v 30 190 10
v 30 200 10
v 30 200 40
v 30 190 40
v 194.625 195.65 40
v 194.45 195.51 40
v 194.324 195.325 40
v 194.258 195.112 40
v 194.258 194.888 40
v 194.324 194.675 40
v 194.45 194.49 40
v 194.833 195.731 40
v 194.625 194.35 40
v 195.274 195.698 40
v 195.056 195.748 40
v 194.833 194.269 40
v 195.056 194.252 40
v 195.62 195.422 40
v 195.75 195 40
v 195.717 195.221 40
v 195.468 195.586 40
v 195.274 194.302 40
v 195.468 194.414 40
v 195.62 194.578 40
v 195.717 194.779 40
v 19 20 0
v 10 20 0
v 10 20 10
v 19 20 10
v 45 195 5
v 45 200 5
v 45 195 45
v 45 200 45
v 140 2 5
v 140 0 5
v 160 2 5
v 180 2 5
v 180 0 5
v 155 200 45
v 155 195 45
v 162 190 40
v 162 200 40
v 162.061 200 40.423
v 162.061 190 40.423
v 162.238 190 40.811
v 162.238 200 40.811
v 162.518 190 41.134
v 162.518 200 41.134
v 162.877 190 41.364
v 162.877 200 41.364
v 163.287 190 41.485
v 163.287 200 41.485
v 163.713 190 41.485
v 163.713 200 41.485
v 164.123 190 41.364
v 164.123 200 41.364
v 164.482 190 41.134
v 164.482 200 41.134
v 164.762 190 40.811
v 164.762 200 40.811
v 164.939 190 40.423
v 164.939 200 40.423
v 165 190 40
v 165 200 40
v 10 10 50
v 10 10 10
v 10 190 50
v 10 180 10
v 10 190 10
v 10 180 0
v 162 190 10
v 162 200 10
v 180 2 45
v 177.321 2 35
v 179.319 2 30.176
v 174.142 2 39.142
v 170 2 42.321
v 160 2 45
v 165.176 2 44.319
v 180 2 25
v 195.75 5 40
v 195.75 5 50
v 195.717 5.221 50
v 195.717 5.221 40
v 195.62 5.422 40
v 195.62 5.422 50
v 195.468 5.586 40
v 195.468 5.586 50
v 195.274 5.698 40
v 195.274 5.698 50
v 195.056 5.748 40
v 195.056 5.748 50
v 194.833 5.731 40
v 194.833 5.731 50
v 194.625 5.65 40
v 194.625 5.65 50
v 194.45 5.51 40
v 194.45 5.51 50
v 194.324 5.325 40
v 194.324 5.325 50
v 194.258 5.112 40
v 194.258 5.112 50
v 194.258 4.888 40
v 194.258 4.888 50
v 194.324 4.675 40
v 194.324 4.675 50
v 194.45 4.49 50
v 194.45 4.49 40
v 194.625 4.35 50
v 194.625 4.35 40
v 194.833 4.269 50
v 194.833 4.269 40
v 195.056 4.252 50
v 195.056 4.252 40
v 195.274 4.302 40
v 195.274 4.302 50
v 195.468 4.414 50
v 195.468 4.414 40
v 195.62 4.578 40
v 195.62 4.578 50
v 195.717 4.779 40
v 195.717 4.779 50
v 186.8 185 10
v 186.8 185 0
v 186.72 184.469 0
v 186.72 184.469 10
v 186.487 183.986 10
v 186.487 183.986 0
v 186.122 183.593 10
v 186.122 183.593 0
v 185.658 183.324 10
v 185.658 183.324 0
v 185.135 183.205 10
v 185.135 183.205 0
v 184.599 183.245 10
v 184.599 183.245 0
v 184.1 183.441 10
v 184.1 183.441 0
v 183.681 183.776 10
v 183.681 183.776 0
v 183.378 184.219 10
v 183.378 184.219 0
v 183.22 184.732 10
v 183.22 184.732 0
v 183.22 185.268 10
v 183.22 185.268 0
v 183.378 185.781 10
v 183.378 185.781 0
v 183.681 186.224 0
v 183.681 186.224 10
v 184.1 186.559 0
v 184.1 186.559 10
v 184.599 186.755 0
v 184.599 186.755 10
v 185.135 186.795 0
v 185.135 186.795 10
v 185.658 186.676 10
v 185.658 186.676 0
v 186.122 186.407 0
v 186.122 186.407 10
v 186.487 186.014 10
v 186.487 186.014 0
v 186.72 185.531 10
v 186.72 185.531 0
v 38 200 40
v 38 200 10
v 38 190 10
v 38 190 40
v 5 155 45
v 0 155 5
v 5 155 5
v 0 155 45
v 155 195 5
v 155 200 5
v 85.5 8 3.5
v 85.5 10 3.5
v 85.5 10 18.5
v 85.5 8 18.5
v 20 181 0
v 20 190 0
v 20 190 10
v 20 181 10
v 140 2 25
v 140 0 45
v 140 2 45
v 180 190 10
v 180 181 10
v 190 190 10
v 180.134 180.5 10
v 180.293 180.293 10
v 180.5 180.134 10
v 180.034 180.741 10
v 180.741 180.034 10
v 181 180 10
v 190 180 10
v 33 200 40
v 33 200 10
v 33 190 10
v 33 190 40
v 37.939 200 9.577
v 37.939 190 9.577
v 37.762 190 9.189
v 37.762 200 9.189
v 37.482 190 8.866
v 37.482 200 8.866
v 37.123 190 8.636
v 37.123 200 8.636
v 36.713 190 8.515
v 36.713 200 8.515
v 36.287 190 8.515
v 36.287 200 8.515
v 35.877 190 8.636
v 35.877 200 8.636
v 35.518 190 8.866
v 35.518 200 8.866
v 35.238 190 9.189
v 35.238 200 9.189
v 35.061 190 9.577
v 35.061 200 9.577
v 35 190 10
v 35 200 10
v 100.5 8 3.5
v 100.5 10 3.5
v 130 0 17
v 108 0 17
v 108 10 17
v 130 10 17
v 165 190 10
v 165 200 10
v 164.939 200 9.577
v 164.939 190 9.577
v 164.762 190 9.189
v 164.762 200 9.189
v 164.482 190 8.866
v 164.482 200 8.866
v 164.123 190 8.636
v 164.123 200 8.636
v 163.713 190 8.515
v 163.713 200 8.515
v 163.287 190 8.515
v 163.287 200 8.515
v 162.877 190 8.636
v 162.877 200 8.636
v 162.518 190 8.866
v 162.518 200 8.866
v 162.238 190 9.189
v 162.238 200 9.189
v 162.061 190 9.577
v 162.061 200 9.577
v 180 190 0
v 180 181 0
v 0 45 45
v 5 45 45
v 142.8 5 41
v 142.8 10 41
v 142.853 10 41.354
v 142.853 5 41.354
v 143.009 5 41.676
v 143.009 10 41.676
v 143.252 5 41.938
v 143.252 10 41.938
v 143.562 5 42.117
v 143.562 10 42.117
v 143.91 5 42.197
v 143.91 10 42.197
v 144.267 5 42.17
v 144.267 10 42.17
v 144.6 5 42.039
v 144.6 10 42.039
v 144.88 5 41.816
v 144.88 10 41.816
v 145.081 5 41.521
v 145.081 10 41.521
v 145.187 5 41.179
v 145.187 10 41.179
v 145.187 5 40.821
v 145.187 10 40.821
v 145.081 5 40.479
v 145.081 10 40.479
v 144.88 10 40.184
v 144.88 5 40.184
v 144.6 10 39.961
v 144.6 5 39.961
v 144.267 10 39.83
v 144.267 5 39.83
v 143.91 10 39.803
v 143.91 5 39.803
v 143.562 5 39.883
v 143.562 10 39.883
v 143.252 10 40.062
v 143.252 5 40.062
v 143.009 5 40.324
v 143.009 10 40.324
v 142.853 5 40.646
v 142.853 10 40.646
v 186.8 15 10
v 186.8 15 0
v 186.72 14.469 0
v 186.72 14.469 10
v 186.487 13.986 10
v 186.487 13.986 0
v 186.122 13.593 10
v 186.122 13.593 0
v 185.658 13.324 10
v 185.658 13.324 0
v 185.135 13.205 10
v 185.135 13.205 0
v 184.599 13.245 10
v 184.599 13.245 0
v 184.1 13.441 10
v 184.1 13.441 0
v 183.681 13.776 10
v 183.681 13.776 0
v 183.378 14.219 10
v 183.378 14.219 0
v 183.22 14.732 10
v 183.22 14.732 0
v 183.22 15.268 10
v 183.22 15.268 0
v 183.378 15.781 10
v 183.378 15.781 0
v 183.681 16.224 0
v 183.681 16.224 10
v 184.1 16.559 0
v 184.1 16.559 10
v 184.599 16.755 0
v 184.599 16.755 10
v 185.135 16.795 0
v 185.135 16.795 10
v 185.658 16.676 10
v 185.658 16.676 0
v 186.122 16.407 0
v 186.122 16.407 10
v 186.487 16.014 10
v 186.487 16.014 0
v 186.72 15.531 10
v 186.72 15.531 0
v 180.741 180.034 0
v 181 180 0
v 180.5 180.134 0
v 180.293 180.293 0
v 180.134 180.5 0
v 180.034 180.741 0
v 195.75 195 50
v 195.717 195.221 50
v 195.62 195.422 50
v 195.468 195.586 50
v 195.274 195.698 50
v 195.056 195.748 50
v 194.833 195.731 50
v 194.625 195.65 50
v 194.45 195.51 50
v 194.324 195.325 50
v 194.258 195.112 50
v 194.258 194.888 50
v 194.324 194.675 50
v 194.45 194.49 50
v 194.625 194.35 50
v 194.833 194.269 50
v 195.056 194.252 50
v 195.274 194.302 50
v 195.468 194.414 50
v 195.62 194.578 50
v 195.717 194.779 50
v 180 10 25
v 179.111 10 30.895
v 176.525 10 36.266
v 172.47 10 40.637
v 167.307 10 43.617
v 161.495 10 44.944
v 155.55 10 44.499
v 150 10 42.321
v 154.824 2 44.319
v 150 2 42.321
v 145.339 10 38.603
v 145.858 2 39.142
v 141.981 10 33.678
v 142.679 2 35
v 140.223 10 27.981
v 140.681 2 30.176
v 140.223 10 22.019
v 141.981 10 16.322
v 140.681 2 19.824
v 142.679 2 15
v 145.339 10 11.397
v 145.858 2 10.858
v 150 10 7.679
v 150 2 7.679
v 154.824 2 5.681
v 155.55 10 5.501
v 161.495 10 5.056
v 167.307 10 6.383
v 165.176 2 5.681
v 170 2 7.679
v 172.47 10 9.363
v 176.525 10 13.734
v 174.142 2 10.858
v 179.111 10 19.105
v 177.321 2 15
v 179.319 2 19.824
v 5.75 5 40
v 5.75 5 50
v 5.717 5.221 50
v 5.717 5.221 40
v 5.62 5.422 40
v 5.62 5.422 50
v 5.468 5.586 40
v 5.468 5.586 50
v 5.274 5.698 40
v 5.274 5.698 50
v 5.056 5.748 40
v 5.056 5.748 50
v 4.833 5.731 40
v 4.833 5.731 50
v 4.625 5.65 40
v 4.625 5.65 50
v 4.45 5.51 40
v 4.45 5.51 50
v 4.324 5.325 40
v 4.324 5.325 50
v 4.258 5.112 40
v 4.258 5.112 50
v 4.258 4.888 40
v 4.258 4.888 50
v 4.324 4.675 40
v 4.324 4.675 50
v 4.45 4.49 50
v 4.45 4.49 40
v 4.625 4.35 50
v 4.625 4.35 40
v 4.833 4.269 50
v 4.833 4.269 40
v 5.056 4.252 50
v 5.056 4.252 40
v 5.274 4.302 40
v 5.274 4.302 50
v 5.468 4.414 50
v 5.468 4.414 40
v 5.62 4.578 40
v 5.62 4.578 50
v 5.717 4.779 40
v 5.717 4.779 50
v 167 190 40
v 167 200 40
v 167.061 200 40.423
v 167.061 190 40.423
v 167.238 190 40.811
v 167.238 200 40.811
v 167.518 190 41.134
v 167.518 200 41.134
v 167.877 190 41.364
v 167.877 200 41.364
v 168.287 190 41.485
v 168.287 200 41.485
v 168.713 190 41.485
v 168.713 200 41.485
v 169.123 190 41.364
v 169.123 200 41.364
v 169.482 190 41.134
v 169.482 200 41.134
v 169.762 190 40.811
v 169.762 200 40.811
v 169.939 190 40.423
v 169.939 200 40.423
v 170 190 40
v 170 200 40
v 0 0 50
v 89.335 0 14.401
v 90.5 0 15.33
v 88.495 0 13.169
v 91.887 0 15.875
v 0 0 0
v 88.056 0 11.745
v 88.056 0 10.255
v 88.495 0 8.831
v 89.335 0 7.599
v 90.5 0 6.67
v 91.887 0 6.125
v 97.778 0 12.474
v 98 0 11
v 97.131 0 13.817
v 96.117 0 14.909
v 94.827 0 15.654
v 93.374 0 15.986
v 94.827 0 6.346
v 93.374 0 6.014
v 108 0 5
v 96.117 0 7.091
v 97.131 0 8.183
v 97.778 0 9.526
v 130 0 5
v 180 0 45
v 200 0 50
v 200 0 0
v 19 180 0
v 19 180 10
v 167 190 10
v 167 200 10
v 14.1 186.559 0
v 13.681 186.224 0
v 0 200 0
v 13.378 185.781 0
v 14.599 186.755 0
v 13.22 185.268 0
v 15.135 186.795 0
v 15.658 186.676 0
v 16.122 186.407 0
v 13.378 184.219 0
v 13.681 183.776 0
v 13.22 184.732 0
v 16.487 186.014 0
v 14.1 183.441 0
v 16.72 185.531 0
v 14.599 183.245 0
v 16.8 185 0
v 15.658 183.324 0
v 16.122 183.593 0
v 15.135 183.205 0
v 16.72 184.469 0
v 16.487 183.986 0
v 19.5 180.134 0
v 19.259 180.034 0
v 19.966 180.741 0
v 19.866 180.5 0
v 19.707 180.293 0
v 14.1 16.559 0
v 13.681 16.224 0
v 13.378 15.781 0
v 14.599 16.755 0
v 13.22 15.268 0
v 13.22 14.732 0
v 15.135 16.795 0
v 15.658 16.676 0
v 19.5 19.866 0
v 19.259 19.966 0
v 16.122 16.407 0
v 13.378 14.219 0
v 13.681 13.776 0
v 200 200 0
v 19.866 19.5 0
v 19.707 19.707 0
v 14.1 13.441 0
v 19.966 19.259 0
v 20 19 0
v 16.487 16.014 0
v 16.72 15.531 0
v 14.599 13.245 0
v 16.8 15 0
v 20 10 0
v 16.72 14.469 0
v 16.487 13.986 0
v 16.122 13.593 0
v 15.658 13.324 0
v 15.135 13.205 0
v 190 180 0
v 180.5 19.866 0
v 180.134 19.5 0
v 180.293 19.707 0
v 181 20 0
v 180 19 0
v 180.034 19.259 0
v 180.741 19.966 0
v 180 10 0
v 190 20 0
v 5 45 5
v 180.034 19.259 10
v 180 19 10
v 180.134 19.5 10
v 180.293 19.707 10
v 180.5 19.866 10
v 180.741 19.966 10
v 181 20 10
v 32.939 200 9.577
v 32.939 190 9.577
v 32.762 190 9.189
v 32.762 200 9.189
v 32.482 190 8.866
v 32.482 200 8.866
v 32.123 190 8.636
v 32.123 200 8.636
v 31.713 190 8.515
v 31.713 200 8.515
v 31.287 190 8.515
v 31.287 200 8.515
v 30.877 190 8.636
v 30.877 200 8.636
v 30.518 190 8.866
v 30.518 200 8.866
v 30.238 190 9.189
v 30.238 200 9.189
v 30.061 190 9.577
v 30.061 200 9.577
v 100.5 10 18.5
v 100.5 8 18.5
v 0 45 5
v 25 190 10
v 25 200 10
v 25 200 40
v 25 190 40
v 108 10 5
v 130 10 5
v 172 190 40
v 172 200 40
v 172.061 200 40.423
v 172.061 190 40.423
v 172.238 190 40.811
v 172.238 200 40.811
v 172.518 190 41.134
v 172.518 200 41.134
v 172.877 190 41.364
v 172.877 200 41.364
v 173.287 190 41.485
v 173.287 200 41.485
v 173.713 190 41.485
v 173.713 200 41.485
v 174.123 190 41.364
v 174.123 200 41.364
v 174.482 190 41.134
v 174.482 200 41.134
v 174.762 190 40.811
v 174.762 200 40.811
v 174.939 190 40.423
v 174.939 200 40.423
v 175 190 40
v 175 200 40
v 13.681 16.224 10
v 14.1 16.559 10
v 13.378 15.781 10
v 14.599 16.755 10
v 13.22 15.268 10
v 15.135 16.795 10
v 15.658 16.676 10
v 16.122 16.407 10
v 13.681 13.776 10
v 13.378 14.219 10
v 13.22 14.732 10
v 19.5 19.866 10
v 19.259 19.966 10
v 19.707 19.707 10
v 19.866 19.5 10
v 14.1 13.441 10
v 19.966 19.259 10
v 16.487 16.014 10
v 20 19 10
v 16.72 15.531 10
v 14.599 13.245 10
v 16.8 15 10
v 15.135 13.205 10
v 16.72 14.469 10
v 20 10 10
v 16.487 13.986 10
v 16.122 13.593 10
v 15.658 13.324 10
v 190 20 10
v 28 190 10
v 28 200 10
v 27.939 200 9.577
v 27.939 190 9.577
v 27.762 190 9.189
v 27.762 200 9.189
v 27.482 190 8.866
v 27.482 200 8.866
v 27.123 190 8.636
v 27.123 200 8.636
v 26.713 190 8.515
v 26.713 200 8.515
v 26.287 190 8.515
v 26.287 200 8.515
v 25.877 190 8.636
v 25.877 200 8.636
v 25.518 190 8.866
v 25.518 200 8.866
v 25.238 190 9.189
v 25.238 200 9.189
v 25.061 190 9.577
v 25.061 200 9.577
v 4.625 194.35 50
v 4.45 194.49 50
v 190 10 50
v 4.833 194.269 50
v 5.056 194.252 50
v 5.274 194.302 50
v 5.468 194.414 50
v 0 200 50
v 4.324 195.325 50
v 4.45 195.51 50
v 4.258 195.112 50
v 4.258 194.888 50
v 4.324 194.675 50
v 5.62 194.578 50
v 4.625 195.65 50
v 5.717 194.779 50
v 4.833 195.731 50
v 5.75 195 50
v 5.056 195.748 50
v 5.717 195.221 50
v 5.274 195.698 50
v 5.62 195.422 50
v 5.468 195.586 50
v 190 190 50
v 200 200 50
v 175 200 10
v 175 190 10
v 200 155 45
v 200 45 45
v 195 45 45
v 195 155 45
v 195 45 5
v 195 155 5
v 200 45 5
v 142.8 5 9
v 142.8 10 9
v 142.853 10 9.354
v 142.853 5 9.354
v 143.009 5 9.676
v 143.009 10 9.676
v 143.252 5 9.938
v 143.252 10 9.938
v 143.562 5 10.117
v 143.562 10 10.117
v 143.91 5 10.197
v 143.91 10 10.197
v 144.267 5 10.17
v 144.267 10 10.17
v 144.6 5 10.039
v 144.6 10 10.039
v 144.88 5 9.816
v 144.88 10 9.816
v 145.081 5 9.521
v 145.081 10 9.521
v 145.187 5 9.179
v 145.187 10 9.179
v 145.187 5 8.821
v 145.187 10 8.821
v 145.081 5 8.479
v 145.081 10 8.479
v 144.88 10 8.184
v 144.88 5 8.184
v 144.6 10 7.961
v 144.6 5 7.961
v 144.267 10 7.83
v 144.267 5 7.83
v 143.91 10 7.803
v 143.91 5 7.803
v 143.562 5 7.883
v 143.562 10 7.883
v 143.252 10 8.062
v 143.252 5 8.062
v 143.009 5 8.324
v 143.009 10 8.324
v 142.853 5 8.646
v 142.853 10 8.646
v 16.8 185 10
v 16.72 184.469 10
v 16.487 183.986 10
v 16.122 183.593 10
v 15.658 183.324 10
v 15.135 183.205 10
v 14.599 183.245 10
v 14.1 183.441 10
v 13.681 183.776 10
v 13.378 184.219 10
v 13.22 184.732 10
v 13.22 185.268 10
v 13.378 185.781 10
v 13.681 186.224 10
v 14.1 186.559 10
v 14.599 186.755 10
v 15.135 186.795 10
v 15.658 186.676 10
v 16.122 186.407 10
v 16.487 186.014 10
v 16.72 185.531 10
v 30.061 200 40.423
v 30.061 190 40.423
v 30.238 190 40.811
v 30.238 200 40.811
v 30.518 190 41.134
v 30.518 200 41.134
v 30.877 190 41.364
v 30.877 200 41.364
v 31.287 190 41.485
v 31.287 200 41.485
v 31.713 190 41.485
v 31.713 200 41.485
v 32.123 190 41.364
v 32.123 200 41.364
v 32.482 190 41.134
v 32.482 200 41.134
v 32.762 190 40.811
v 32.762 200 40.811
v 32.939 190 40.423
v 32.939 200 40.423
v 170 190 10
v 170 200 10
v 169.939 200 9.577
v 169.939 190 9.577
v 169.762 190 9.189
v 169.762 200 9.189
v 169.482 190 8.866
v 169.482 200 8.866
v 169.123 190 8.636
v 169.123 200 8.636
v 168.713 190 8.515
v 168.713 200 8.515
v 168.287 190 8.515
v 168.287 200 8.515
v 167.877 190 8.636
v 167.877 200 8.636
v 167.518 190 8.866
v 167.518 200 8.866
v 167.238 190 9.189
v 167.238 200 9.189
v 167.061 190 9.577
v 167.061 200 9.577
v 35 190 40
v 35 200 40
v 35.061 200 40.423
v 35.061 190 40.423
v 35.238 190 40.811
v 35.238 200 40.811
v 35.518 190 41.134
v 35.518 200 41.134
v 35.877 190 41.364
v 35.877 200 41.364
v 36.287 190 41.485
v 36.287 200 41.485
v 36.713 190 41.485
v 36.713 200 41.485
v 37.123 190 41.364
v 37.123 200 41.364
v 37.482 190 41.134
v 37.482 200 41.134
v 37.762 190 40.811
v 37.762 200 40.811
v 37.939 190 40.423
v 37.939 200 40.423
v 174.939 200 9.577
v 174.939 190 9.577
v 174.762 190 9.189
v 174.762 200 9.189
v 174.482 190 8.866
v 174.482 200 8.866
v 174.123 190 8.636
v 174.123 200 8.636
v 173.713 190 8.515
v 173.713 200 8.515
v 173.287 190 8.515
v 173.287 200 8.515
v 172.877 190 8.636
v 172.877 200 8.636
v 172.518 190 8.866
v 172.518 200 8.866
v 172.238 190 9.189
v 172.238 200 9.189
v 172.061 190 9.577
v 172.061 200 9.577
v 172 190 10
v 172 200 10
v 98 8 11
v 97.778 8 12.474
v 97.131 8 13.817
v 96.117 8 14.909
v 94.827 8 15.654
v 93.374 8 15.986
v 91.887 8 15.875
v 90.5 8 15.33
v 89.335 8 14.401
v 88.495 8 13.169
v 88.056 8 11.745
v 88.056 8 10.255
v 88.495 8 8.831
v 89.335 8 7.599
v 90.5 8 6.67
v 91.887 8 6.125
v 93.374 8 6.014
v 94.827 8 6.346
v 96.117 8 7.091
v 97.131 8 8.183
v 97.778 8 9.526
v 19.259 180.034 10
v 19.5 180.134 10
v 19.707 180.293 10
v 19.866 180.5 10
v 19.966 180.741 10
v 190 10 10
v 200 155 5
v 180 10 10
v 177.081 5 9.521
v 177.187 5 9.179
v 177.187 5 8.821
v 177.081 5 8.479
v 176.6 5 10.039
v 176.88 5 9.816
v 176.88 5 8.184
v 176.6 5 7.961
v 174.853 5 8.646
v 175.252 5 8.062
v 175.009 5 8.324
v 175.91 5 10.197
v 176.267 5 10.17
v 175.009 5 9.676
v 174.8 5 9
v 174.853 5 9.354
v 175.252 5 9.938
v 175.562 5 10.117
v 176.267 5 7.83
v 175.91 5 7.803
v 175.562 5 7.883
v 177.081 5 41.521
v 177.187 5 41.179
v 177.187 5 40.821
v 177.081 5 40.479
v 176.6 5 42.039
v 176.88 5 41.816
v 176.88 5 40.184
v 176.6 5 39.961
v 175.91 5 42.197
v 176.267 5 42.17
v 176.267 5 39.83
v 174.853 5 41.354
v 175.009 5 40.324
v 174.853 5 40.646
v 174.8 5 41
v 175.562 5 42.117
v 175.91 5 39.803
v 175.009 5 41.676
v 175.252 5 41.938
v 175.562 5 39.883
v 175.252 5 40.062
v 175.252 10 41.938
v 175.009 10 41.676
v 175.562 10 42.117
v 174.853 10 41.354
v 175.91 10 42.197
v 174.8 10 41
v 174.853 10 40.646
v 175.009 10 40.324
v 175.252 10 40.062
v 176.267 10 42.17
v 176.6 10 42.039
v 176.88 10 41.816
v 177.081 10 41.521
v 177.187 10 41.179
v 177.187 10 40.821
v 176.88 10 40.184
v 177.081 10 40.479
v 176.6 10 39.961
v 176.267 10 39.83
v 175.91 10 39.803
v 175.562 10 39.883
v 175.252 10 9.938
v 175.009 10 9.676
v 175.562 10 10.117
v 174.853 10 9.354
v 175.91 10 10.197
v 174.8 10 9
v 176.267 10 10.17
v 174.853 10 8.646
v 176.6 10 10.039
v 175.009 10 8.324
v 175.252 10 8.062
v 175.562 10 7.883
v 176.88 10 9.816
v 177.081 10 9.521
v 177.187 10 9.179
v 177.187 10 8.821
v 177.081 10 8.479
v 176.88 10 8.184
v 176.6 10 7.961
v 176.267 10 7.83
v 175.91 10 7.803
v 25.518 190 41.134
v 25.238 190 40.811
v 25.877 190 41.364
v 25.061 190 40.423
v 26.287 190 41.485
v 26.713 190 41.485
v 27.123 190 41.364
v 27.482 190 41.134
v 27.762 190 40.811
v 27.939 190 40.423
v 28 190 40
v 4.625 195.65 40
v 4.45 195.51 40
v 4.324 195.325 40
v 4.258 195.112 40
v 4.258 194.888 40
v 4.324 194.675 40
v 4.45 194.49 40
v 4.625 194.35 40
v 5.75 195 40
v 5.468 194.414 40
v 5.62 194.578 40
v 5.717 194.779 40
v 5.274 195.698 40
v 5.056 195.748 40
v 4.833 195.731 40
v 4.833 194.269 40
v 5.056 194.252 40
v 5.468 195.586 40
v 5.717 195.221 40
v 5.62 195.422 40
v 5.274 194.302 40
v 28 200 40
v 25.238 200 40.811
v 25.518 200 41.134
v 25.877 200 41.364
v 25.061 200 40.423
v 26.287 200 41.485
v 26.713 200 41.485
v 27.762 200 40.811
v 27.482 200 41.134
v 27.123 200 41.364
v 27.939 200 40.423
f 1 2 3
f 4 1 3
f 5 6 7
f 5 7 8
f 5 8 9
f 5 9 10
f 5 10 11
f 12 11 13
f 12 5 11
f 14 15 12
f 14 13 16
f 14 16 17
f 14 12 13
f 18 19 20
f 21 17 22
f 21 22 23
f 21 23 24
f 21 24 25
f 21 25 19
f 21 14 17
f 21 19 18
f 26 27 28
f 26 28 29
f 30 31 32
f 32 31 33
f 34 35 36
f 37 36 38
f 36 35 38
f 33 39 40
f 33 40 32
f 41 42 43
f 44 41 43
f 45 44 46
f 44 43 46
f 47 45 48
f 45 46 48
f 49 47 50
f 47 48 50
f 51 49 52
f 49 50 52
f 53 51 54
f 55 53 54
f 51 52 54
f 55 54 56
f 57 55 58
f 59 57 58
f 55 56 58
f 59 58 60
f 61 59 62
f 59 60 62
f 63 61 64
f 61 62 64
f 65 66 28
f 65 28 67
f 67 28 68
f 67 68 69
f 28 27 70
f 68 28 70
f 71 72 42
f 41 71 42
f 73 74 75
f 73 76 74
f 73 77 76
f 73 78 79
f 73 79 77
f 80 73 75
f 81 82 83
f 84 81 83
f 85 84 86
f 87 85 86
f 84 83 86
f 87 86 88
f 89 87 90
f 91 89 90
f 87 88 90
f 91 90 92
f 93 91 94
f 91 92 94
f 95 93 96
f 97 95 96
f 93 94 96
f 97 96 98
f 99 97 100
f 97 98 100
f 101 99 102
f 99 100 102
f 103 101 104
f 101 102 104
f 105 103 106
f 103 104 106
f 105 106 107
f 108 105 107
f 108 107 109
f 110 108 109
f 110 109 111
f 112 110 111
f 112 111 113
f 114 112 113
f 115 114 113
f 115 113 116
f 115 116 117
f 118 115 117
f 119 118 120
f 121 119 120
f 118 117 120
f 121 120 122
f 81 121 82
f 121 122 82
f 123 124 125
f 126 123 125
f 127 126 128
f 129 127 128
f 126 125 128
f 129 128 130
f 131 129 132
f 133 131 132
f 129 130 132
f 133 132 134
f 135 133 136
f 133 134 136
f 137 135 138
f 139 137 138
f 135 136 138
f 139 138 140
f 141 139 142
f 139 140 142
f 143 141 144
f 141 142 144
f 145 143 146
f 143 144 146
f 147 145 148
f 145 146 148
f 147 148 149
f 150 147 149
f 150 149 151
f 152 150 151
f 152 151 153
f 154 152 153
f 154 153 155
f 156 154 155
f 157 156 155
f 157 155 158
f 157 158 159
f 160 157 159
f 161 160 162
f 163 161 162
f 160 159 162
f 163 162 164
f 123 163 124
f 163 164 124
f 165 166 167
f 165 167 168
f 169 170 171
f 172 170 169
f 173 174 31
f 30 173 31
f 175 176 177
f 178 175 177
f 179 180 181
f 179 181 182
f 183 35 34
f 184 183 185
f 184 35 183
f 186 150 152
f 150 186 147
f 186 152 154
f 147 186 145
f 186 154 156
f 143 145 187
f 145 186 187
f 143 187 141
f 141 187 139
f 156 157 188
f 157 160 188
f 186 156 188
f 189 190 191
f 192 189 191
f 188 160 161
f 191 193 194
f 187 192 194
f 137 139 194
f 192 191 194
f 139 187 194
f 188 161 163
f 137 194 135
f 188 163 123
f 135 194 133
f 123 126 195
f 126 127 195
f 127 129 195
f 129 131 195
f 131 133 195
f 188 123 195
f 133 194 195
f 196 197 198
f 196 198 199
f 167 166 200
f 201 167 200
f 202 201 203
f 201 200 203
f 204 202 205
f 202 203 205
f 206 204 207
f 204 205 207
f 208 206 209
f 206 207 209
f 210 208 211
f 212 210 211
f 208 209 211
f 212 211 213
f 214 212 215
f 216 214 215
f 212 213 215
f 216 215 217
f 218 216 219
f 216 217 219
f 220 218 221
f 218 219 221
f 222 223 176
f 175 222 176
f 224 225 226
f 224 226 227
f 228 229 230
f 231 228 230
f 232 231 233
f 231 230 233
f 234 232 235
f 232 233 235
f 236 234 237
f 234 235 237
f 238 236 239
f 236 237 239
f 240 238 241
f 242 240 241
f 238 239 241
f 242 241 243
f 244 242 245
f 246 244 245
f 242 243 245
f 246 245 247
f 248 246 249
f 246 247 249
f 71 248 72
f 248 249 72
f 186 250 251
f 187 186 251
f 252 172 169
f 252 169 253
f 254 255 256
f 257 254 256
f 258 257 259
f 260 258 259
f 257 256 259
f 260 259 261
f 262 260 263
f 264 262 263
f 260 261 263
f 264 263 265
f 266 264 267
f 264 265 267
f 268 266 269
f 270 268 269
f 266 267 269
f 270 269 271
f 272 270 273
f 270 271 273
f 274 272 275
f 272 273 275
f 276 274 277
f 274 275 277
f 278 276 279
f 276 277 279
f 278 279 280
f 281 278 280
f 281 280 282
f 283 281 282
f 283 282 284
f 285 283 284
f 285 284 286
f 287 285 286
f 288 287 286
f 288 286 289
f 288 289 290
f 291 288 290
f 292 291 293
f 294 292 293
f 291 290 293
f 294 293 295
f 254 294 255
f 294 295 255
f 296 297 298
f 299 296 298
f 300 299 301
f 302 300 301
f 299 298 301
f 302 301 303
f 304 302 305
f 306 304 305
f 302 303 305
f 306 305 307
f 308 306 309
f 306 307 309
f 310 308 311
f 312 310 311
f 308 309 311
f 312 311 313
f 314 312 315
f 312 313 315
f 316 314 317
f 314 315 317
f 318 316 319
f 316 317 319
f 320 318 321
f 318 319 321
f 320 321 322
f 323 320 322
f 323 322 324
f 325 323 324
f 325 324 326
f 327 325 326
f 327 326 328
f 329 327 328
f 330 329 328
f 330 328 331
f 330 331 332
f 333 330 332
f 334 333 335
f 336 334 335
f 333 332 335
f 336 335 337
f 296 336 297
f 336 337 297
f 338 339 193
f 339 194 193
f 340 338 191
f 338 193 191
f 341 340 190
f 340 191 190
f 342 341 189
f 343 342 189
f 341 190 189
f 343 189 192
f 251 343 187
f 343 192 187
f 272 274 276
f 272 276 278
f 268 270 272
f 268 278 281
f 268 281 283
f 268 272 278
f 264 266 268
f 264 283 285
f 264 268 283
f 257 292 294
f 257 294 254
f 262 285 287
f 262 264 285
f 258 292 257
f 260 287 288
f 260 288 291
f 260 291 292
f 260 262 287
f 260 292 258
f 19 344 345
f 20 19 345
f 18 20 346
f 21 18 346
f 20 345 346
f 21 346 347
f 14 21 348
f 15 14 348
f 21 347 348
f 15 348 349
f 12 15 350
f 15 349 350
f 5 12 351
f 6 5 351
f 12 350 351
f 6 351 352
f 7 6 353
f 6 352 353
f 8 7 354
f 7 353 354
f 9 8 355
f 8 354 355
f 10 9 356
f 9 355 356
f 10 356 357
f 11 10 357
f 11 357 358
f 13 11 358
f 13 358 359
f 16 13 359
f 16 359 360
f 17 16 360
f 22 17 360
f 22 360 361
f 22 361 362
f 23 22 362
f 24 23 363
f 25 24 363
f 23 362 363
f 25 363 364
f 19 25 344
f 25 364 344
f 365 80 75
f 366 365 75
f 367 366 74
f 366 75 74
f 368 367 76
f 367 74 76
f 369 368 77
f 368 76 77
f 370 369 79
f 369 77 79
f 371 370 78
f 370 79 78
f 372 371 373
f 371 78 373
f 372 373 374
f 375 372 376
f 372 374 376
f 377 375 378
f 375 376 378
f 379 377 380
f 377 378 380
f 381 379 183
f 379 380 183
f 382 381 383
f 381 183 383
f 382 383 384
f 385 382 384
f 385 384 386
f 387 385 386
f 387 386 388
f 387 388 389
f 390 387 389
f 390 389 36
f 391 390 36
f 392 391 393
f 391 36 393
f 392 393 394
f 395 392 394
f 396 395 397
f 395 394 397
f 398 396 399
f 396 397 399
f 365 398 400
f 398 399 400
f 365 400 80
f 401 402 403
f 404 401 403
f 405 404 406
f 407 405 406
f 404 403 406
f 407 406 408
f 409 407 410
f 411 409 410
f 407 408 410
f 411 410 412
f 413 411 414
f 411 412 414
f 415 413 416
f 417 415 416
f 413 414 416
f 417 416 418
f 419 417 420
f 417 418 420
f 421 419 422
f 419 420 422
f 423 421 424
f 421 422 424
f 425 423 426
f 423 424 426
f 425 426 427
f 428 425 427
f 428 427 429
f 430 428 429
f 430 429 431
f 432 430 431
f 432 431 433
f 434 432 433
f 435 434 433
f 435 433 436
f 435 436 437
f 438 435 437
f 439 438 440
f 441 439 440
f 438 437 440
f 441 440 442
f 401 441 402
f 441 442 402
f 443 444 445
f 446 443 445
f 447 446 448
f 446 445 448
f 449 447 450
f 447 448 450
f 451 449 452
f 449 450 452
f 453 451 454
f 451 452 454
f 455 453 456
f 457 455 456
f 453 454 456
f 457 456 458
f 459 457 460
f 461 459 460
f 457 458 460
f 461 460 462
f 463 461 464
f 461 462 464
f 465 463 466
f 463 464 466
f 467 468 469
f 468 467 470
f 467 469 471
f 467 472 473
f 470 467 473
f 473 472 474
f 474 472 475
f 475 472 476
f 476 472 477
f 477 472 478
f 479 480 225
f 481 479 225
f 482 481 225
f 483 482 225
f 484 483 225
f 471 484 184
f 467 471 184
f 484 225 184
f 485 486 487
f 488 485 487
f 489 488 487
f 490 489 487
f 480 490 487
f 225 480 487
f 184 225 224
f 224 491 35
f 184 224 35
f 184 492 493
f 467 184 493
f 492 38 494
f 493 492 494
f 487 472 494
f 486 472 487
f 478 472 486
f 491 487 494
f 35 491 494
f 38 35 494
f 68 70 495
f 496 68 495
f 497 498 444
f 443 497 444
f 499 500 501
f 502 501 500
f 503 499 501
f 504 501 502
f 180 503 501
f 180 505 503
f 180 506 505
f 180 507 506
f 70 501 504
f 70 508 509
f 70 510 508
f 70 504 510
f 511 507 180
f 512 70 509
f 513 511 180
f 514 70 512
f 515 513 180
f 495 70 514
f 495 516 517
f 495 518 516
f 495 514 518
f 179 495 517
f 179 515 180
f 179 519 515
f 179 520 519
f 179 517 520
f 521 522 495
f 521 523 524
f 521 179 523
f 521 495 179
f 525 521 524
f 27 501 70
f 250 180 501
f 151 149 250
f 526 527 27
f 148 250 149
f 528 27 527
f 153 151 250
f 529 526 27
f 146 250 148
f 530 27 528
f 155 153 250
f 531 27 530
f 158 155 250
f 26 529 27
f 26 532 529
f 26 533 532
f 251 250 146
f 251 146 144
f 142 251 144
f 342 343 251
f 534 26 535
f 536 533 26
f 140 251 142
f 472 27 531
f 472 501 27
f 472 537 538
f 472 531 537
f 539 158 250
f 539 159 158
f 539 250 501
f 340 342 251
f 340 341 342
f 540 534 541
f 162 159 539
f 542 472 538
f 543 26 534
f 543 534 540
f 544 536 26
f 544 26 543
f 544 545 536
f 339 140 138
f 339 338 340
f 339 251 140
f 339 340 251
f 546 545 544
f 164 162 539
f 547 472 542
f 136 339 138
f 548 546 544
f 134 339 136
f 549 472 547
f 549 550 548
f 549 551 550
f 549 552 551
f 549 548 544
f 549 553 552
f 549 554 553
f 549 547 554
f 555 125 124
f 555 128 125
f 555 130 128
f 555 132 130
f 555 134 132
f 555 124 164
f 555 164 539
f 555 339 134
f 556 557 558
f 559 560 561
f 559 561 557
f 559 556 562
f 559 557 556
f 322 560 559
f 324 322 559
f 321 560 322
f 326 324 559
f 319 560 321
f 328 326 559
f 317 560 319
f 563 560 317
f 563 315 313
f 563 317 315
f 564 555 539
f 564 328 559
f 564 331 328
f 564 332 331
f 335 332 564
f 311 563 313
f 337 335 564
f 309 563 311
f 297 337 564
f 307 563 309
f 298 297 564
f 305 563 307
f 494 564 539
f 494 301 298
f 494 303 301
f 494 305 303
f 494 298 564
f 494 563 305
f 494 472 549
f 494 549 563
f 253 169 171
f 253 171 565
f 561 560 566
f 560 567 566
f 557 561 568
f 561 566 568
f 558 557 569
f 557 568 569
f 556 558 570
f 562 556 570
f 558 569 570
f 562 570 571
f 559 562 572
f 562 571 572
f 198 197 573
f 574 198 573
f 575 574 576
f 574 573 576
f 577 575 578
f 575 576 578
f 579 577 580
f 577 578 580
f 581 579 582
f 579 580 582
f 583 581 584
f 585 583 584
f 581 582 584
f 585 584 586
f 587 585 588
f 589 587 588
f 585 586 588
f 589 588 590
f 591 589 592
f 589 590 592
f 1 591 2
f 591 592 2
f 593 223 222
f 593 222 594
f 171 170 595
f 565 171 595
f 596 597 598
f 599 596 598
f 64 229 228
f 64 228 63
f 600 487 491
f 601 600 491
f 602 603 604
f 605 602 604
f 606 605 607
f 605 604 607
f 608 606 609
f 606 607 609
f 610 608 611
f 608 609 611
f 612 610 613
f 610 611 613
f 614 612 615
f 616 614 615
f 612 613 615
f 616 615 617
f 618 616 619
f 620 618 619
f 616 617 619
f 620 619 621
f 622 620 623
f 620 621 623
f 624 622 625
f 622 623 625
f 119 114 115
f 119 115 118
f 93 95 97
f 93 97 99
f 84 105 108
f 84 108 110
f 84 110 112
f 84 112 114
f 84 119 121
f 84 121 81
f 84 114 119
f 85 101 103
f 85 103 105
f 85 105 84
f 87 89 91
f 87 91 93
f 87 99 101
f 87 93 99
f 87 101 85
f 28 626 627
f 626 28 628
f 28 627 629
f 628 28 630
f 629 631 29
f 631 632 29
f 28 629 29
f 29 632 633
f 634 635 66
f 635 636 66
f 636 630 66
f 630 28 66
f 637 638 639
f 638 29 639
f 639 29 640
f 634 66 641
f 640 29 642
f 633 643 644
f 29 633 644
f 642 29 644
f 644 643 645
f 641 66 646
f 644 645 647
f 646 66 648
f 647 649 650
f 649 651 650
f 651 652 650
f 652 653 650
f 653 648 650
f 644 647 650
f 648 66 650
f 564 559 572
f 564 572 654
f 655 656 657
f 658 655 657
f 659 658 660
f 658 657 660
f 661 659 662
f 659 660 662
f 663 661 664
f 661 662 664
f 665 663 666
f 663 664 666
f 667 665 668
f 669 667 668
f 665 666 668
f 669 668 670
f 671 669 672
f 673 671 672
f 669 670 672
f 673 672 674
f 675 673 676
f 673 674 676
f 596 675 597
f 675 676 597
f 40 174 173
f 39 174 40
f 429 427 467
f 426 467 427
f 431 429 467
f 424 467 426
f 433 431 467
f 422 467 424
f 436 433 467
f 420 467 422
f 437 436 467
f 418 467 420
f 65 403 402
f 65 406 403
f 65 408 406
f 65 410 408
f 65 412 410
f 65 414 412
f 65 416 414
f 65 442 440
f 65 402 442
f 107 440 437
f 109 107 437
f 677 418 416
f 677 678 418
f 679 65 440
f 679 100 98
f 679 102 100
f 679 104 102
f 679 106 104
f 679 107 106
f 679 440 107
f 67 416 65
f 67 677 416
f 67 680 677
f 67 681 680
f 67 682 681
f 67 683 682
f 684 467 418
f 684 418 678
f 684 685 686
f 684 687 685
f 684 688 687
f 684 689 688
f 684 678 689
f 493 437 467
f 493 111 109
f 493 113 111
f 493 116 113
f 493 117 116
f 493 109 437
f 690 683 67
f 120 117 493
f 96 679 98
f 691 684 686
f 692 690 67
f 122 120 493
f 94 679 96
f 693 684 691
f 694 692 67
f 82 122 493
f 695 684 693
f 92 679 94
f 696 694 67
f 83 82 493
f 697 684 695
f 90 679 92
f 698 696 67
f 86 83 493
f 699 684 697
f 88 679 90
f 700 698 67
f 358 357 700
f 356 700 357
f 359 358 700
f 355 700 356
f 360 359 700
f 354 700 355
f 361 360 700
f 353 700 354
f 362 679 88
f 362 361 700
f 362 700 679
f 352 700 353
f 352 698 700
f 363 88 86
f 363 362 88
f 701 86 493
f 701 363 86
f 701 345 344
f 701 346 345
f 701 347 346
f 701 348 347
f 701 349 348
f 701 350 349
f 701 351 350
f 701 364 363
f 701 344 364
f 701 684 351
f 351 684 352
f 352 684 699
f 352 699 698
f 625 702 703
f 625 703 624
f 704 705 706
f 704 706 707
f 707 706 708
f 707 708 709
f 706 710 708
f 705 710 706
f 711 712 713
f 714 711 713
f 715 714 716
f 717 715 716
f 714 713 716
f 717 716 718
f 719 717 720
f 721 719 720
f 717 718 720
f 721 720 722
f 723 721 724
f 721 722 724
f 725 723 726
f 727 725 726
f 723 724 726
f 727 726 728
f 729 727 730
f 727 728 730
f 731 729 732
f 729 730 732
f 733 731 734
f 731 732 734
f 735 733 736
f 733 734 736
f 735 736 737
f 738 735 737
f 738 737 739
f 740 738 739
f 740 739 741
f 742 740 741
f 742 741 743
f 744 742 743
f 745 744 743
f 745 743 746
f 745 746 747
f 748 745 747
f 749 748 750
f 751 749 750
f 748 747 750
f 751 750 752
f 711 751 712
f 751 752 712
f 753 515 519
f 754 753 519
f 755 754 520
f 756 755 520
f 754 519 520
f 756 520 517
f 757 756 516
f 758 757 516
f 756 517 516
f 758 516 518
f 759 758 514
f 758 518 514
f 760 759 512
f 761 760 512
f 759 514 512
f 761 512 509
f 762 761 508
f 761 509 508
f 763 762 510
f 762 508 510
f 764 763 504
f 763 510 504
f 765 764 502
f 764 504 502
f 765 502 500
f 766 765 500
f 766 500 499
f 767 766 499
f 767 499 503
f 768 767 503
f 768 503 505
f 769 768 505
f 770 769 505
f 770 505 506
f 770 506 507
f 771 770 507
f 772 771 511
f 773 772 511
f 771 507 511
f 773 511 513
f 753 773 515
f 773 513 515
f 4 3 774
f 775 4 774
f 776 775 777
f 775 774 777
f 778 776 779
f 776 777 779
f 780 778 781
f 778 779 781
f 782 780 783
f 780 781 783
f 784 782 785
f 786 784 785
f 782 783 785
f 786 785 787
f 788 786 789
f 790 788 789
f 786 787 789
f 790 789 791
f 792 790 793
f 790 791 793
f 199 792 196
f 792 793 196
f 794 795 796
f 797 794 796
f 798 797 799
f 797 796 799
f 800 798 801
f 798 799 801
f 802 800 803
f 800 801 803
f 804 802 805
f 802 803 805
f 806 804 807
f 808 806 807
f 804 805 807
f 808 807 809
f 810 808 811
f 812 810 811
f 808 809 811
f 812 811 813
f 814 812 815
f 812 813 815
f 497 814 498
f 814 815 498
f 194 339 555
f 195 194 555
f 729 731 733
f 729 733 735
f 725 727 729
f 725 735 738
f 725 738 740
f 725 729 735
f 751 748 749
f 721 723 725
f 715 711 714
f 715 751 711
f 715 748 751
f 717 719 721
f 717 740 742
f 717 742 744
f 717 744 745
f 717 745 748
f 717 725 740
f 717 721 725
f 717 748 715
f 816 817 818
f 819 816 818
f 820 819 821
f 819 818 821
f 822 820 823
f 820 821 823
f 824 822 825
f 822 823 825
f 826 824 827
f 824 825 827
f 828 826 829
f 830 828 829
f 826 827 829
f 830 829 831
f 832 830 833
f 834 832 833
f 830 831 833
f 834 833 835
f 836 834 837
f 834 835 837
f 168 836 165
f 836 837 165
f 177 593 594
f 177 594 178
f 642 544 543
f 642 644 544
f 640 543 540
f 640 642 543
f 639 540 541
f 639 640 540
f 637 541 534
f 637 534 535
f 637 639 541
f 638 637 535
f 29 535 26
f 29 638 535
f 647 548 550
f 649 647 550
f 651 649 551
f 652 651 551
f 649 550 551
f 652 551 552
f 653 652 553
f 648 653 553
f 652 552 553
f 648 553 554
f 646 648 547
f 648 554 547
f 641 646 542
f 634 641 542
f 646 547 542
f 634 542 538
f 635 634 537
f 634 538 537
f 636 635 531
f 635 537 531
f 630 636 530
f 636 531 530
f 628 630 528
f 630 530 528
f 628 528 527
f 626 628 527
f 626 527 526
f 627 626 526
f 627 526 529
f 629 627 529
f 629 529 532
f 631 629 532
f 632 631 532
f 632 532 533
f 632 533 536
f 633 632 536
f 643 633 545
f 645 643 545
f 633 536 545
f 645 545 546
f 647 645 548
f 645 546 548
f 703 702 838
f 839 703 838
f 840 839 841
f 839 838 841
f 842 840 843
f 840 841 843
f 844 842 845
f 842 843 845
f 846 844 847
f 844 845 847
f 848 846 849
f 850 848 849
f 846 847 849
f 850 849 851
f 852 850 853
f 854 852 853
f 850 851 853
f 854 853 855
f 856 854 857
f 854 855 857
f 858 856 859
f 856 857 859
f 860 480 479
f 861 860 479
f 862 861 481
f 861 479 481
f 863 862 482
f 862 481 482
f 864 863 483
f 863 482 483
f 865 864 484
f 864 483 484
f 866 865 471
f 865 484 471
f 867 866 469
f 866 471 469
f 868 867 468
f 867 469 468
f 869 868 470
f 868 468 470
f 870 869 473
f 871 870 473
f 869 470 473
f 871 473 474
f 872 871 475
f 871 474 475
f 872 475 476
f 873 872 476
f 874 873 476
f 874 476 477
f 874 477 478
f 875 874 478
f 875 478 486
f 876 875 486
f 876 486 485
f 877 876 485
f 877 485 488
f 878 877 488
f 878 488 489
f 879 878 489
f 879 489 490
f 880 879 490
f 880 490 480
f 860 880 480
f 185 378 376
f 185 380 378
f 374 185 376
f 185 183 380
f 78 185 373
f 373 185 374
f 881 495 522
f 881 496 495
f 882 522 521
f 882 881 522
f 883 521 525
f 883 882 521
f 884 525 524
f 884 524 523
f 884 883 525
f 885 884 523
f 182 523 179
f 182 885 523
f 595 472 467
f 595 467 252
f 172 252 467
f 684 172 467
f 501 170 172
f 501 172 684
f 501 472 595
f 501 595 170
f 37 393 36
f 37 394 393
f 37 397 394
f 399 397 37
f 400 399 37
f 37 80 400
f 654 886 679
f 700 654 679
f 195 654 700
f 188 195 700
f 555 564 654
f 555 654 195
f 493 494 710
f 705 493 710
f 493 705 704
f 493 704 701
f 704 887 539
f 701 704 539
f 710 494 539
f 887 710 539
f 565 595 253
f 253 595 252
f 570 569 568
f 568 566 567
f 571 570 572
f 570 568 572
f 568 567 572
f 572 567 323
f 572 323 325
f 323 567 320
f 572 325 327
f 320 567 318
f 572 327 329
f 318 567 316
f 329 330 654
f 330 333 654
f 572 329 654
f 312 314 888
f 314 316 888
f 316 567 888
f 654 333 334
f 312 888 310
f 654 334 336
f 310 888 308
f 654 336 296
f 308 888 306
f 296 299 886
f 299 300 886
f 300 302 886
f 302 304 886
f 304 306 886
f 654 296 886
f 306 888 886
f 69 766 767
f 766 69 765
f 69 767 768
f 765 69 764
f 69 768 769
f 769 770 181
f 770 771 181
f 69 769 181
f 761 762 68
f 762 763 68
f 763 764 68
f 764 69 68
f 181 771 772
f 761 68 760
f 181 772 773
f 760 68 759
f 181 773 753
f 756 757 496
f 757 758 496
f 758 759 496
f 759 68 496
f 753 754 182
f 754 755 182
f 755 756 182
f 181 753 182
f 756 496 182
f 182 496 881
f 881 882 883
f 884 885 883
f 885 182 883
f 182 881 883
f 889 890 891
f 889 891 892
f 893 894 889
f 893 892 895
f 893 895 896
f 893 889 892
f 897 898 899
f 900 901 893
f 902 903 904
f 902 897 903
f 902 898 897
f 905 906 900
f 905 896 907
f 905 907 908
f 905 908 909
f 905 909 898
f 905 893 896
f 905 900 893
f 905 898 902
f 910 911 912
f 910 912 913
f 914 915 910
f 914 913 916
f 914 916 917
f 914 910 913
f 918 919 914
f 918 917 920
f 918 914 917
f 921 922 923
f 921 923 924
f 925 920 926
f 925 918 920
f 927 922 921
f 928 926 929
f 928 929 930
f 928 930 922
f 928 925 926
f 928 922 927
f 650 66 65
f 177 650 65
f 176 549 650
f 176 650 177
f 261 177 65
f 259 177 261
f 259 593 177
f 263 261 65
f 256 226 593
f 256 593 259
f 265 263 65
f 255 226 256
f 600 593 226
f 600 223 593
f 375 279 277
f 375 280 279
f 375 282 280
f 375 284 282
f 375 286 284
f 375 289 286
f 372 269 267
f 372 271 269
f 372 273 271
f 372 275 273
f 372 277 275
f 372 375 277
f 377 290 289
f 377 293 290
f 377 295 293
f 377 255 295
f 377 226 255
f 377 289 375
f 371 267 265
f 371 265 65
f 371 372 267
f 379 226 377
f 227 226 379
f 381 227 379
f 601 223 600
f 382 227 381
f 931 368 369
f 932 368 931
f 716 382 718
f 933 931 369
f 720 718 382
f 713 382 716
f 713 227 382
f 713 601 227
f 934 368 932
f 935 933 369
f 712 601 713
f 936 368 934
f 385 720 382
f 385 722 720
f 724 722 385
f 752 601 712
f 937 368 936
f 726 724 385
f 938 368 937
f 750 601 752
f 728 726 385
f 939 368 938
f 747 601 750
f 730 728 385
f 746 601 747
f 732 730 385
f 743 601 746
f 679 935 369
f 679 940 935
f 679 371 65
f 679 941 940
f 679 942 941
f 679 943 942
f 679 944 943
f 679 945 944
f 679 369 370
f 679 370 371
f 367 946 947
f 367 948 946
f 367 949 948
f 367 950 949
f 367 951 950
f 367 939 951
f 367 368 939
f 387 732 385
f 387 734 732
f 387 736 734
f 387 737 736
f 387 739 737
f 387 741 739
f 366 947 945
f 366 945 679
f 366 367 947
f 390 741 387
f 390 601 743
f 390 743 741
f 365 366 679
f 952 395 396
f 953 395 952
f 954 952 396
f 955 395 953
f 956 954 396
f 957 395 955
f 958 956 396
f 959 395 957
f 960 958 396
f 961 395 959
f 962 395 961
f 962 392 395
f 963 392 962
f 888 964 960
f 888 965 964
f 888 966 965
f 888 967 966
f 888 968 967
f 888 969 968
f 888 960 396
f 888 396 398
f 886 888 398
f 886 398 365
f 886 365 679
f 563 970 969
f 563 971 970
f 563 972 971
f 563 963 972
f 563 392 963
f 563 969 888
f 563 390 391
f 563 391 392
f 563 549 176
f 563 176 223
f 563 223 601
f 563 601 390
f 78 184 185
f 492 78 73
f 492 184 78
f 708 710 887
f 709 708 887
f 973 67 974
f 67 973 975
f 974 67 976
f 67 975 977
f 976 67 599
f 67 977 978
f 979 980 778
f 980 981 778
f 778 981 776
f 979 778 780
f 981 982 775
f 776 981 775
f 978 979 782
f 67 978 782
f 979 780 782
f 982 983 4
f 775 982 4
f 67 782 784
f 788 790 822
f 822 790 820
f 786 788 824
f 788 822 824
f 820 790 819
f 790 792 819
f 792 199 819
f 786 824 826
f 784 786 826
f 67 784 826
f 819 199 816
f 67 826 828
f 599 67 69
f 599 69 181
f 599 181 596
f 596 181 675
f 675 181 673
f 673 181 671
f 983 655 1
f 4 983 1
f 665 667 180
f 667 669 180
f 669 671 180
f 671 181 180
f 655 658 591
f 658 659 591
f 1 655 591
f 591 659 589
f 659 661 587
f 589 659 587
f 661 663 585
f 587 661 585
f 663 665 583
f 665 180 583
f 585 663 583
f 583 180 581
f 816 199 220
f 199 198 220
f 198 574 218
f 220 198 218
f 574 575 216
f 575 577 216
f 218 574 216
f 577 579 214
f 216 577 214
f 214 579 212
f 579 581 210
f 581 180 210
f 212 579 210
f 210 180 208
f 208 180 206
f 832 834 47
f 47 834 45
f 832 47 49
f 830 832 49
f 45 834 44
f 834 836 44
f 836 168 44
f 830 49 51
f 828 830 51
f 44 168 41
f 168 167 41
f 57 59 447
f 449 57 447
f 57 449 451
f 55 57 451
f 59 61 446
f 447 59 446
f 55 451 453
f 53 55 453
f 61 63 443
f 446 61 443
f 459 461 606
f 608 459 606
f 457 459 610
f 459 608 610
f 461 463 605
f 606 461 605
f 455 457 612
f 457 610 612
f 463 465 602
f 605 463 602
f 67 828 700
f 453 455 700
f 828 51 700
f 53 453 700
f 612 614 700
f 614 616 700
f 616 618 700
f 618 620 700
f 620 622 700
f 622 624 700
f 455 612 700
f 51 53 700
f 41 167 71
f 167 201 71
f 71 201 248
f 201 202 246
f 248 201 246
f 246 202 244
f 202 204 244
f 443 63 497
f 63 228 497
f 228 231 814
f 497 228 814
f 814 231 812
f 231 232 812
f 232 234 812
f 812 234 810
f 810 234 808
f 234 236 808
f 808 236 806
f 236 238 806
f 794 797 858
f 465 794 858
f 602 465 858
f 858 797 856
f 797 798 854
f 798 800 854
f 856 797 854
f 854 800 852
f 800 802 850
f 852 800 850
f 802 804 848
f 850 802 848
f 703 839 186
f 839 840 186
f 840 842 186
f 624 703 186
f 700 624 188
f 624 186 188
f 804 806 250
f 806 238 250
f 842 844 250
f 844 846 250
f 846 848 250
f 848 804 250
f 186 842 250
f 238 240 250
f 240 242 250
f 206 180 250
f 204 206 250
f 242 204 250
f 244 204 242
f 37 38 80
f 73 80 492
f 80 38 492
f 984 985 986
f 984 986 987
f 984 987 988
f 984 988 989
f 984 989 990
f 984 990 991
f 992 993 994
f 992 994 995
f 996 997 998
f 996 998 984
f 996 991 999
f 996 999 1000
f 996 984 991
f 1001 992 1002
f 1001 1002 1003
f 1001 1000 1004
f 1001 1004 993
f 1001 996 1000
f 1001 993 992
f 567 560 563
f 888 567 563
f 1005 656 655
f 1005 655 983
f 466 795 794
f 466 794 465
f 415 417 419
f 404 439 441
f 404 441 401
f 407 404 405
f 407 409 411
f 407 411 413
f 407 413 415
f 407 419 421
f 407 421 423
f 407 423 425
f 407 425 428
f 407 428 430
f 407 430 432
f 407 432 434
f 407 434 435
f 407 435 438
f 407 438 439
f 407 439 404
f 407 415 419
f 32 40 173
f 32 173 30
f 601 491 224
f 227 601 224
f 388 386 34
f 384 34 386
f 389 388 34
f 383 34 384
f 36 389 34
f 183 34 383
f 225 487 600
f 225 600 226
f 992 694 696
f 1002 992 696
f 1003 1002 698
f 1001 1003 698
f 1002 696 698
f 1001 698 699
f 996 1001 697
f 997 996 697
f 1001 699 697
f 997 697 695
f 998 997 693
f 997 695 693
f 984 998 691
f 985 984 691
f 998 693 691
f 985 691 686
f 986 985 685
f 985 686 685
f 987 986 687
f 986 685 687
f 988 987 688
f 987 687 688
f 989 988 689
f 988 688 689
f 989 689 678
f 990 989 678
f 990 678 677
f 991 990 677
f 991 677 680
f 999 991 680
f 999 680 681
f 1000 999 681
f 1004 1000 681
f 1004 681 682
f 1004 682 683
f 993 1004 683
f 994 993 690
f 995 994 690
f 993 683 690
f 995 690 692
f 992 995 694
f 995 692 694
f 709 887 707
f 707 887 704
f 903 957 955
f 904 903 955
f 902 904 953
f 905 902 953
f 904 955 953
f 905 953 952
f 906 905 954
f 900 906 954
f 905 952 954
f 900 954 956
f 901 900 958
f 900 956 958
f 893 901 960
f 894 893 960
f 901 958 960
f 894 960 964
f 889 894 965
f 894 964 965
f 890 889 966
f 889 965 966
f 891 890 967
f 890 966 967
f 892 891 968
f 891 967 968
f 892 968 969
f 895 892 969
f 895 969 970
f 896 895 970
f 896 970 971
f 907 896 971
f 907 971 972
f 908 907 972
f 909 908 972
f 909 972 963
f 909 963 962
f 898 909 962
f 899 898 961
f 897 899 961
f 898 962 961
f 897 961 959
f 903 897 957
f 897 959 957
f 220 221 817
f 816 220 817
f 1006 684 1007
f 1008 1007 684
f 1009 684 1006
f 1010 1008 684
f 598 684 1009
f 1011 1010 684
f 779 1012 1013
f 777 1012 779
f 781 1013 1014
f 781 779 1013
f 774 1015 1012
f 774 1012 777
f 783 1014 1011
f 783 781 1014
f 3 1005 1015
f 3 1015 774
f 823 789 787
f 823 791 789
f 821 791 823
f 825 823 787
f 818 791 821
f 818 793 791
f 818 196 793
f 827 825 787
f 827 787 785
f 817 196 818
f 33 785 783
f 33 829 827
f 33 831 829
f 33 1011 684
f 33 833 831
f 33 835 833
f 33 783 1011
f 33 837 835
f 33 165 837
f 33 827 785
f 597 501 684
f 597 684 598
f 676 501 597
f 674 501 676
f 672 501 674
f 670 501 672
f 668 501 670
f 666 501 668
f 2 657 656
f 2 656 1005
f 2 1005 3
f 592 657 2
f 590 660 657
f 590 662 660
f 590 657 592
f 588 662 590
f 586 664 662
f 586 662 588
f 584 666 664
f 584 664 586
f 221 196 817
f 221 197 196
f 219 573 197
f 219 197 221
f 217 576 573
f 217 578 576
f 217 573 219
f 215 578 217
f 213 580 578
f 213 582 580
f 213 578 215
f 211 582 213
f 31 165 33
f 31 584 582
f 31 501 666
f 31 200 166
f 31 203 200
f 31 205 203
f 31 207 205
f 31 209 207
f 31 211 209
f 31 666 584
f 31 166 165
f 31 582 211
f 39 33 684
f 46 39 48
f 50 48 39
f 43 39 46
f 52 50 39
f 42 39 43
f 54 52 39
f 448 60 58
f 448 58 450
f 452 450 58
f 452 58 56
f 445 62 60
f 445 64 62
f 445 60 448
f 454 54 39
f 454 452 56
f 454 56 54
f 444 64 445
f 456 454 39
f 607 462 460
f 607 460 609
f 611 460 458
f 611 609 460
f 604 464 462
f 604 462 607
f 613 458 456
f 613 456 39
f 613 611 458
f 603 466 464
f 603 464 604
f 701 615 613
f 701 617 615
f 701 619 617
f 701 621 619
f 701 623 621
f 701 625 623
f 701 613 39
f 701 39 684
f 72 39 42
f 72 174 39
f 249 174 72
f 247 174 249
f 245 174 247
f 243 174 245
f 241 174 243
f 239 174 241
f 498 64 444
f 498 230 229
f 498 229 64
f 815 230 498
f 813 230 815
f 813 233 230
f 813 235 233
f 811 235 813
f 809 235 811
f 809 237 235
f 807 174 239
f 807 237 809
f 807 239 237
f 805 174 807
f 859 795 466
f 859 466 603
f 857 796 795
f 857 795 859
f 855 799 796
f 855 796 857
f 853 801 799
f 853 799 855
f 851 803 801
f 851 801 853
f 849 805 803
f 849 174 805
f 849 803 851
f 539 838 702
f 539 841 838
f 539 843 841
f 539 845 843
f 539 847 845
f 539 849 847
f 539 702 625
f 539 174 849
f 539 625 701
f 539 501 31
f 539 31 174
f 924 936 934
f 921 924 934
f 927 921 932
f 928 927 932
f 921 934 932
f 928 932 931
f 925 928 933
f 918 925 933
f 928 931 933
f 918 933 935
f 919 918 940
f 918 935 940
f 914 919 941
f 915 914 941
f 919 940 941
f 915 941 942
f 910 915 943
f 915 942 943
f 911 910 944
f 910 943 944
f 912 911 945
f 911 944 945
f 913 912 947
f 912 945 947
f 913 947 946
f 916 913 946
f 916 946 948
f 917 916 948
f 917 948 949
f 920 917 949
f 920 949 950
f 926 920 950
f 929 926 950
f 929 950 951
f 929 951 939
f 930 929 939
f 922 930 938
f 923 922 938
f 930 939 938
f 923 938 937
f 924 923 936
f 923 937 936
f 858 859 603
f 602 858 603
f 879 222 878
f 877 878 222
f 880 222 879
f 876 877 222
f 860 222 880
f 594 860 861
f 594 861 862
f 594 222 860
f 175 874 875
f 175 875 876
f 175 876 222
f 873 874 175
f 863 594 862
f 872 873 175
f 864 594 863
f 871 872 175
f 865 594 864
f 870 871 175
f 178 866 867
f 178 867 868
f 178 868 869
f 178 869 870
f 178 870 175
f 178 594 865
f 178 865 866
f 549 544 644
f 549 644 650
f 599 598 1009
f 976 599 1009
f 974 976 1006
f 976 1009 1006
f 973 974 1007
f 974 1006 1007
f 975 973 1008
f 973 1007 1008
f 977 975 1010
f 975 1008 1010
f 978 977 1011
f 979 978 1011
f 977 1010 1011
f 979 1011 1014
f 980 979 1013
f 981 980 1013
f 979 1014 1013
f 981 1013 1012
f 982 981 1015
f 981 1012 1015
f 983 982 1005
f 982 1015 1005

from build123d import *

# Parameters (mm, degrees)
SKETCH_W        = 200
SKETCH_H        = 200
SKETCH_W_2      = 180
SKETCH_H_2      = 180
PAD_DEPTH       = 50
SKETCH001_W     = 40
SKETCH001_H     = 40
POCKET_DEPTH    = 2
SKETCH002_R     = 20
POCKET001_DEPTH = 8
SKETCH003_W     = 22
SKETCH003_H     = 12
POCKET002_DEPTH = 10
SKETCH004_R     = 5
POCKET003_DEPTH = 10
SKETCH005_W     = 15
SKETCH005_H     = 15
POCKET004_DEPTH = 2
SKETCH006_R     = 0.75
POCKET005_DEPTH = 10
POCKET006_DEPTH = 10
SKETCH008_W     = 10
SKETCH008_H     = 10
SKETCH008_R     = 1.8
PAD001_DEPTH    = 10
FILLET_R        = 1
SKETCH009_R     = 1.2
POCKET007_DEPTH = 5
SKETCH010_W     = 110
SKETCH010_H     = 40
POCKET008_DEPTH = 5
SKETCH011_W     = 110
SKETCH011_H     = 40
POCKET009_DEPTH = 5
SKETCH012_W     = 110
SKETCH012_H     = 40
POCKET010_DEPTH = 5


with BuildPart() as part:
    # Sketch → Pad (new body)
    with BuildSketch(Plane.XY):
        with Locations((100, 100)):
            Rectangle(SKETCH_W, SKETCH_H)
        with Locations((100, 100)):
            Rectangle(SKETCH_W_2, SKETCH_H_2, mode=Mode.SUBTRACT)
    extrude(amount=PAD_DEPTH)

    # Sketch001 (on Face1 of Pad) → Pocket (cut)
    with BuildSketch(Plane.XZ):
        with Locations((160, 25)):
            Rectangle(SKETCH001_W, SKETCH001_H)
    extrude(amount=-POCKET_DEPTH, mode=Mode.SUBTRACT)

    # Sketch002 (on Face15 of Pocket) → Pocket001 (cut)
    with BuildSketch(Plane.XZ.offset(-2)):
        with Locations((160, 25)):
            Circle(SKETCH002_R)
    extrude(amount=-POCKET001_DEPTH, mode=Mode.SUBTRACT)

    # Sketch003 (on Face1 of Pocket001) → Pocket002 (cut)
    with BuildSketch(Plane.XZ):
        with Locations((119, 11)):
            Rectangle(SKETCH003_W, SKETCH003_H)
    extrude(amount=-POCKET002_DEPTH, mode=Mode.SUBTRACT)

    # Sketch004 (on Face1 of Pocket002) → Pocket003 (cut)
    with BuildSketch(Plane.XZ):
        with Locations((93, 11)):
            Circle(SKETCH004_R)
    extrude(amount=-POCKET003_DEPTH, mode=Mode.SUBTRACT)

    # Sketch005 (on Face16 of Pocket003) → Pocket004 (cut)
    with BuildSketch(Plane(origin=(0, 10, 0), x_dir=(-1, 0, 0), z_dir=(0, 1, 0))):
        with Locations((-93, 11)):
            Rectangle(SKETCH005_W, SKETCH005_H)
    extrude(amount=-POCKET004_DEPTH, mode=Mode.SUBTRACT)

    # Sketch006 (on Face4 of Pocket004) → Pocket005 (cut)
    with BuildSketch(Plane.XY.offset(50)):
        with Locations((5, 5)):
            Circle(SKETCH006_R)
        with Locations((195, 5)):
            Circle(SKETCH006_R)
        with Locations((195, 195)):
            Circle(SKETCH006_R)
        with Locations((5, 195)):
            Circle(SKETCH006_R)
    extrude(amount=-POCKET005_DEPTH, mode=Mode.SUBTRACT)

    # Sketch007 (on Face15 of Pocket005) → Pocket006 (cut)
    with BuildSketch(Plane(origin=(0, 200, 0), x_dir=(-1, 0, 0), z_dir=(0, 1, 0))):
        with BuildLine():
            ThreePointArc((-38, 10), (-36.5, 8.5), (-35, 10))
            Line((-35, 10), (-35, 40))
            ThreePointArc((-35, 40), (-36.5, 41.5), (-38, 40))
            Line((-38, 10), (-38, 40))
        make_face()
        with BuildLine():
            ThreePointArc((-33, 10), (-31.5, 8.5), (-30, 10))
            Line((-30, 10), (-30, 40))
            ThreePointArc((-30, 40), (-31.5, 41.5), (-33, 40))
            Line((-33, 10), (-33, 40))
        make_face()
        with BuildLine():
            ThreePointArc((-28, 10), (-26.5, 8.5), (-25, 10))
            Line((-25, 10), (-25, 40))
            ThreePointArc((-25, 40), (-26.5, 41.5), (-28, 40))
            Line((-28, 10), (-28, 40))
        make_face()
        with BuildLine():
            ThreePointArc((-165, 10), (-163.5, 8.5), (-162, 10))
            Line((-162, 10), (-162, 40))
            ThreePointArc((-162, 40), (-163.5, 41.5), (-165, 40))
            Line((-165, 10), (-165, 40))
        make_face()
        with BuildLine():
            ThreePointArc((-170, 10), (-168.5, 8.5), (-167, 10))
            Line((-167, 10), (-167, 40))
            ThreePointArc((-167, 40), (-168.5, 41.5), (-170, 40))
            Line((-170, 10), (-170, 40))
        make_face()
        with BuildLine():
            ThreePointArc((-175, 10), (-173.5, 8.5), (-172, 10))
            Line((-172, 10), (-172, 40))
            ThreePointArc((-172, 40), (-173.5, 41.5), (-175, 40))
            Line((-175, 10), (-175, 40))
        make_face()
    extrude(amount=-POCKET006_DEPTH, mode=Mode.SUBTRACT)

    # Sketch008 (on Face3 of Pocket006) → Pad001 (join)
    with BuildSketch(Plane(origin=(0, 0, 0), x_dir=(1, 0, 0), z_dir=(0, 0, -1))):
        with Locations((185, -15)):
            Rectangle(SKETCH008_W, SKETCH008_H)
        with Locations((185, -15)):
            Circle(SKETCH008_R, mode=Mode.SUBTRACT)
        with Locations((185, -185)):
            Rectangle(SKETCH008_W, SKETCH008_H)
        with Locations((185, -185)):
            Circle(SKETCH008_R, mode=Mode.SUBTRACT)
        with Locations((15, -15)):
            Rectangle(SKETCH008_W, SKETCH008_H)
        with Locations((15, -15)):
            Circle(SKETCH008_R, mode=Mode.SUBTRACT)
        with Locations((15, -185)):
            Rectangle(SKETCH008_W, SKETCH008_H)
        with Locations((15, -185)):
            Circle(SKETCH008_R, mode=Mode.SUBTRACT)
    extrude(amount=-PAD001_DEPTH)

    # Fillet
    fillet_edges = [part.edges().sort_by_distance(p)[0] for p in [
        (180, 20, 5),
        (20, 20, 5),
        (180, 180, 5),
        (20, 180, 5),
    ]]
    fillet(fillet_edges, radius=FILLET_R)

    # Sketch009 (on Face8 of Fillet) → Pocket007 (cut)
    with BuildSketch(Plane(origin=(0, 10, 0), x_dir=(-1, 0, 0), z_dir=(0, 1, 0))):
        with Locations((-144, 9)):
            Circle(SKETCH009_R)
        with Locations((-176, 41)):
            Circle(SKETCH009_R)
        with Locations((-176, 9)):
            Circle(SKETCH009_R)
        with Locations((-144, 41)):
            Circle(SKETCH009_R)
    extrude(amount=-POCKET007_DEPTH, mode=Mode.SUBTRACT)

    # Sketch010 (on Face22 of Pocket007) → Pocket008 (cut)
    with BuildSketch(Plane.YZ.offset(200)):
        with Locations((100, 25)):
            Rectangle(SKETCH010_W, SKETCH010_H)
    extrude(amount=-POCKET008_DEPTH, mode=Mode.SUBTRACT)

    # Sketch011 (on Face20 of Pocket008) → Pocket009 (cut)
    with BuildSketch(Plane(origin=(0, 0, 0), x_dir=(0, -1, 0), z_dir=(-1, 0, 0))):
        with Locations((-100, 25)):
            Rectangle(SKETCH011_W, SKETCH011_H)
    extrude(amount=-POCKET009_DEPTH, mode=Mode.SUBTRACT)

    # Sketch012 (on Face21 of Pocket009) → Pocket010 (cut)
    with BuildSketch(Plane(origin=(0, 200, 0), x_dir=(-1, 0, 0), z_dir=(0, 1, 0))):
        with Locations((-100, 25)):
            Rectangle(SKETCH012_W, SKETCH012_H)
    extrude(amount=-POCKET010_DEPTH, mode=Mode.SUBTRACT)


solid = part.part
